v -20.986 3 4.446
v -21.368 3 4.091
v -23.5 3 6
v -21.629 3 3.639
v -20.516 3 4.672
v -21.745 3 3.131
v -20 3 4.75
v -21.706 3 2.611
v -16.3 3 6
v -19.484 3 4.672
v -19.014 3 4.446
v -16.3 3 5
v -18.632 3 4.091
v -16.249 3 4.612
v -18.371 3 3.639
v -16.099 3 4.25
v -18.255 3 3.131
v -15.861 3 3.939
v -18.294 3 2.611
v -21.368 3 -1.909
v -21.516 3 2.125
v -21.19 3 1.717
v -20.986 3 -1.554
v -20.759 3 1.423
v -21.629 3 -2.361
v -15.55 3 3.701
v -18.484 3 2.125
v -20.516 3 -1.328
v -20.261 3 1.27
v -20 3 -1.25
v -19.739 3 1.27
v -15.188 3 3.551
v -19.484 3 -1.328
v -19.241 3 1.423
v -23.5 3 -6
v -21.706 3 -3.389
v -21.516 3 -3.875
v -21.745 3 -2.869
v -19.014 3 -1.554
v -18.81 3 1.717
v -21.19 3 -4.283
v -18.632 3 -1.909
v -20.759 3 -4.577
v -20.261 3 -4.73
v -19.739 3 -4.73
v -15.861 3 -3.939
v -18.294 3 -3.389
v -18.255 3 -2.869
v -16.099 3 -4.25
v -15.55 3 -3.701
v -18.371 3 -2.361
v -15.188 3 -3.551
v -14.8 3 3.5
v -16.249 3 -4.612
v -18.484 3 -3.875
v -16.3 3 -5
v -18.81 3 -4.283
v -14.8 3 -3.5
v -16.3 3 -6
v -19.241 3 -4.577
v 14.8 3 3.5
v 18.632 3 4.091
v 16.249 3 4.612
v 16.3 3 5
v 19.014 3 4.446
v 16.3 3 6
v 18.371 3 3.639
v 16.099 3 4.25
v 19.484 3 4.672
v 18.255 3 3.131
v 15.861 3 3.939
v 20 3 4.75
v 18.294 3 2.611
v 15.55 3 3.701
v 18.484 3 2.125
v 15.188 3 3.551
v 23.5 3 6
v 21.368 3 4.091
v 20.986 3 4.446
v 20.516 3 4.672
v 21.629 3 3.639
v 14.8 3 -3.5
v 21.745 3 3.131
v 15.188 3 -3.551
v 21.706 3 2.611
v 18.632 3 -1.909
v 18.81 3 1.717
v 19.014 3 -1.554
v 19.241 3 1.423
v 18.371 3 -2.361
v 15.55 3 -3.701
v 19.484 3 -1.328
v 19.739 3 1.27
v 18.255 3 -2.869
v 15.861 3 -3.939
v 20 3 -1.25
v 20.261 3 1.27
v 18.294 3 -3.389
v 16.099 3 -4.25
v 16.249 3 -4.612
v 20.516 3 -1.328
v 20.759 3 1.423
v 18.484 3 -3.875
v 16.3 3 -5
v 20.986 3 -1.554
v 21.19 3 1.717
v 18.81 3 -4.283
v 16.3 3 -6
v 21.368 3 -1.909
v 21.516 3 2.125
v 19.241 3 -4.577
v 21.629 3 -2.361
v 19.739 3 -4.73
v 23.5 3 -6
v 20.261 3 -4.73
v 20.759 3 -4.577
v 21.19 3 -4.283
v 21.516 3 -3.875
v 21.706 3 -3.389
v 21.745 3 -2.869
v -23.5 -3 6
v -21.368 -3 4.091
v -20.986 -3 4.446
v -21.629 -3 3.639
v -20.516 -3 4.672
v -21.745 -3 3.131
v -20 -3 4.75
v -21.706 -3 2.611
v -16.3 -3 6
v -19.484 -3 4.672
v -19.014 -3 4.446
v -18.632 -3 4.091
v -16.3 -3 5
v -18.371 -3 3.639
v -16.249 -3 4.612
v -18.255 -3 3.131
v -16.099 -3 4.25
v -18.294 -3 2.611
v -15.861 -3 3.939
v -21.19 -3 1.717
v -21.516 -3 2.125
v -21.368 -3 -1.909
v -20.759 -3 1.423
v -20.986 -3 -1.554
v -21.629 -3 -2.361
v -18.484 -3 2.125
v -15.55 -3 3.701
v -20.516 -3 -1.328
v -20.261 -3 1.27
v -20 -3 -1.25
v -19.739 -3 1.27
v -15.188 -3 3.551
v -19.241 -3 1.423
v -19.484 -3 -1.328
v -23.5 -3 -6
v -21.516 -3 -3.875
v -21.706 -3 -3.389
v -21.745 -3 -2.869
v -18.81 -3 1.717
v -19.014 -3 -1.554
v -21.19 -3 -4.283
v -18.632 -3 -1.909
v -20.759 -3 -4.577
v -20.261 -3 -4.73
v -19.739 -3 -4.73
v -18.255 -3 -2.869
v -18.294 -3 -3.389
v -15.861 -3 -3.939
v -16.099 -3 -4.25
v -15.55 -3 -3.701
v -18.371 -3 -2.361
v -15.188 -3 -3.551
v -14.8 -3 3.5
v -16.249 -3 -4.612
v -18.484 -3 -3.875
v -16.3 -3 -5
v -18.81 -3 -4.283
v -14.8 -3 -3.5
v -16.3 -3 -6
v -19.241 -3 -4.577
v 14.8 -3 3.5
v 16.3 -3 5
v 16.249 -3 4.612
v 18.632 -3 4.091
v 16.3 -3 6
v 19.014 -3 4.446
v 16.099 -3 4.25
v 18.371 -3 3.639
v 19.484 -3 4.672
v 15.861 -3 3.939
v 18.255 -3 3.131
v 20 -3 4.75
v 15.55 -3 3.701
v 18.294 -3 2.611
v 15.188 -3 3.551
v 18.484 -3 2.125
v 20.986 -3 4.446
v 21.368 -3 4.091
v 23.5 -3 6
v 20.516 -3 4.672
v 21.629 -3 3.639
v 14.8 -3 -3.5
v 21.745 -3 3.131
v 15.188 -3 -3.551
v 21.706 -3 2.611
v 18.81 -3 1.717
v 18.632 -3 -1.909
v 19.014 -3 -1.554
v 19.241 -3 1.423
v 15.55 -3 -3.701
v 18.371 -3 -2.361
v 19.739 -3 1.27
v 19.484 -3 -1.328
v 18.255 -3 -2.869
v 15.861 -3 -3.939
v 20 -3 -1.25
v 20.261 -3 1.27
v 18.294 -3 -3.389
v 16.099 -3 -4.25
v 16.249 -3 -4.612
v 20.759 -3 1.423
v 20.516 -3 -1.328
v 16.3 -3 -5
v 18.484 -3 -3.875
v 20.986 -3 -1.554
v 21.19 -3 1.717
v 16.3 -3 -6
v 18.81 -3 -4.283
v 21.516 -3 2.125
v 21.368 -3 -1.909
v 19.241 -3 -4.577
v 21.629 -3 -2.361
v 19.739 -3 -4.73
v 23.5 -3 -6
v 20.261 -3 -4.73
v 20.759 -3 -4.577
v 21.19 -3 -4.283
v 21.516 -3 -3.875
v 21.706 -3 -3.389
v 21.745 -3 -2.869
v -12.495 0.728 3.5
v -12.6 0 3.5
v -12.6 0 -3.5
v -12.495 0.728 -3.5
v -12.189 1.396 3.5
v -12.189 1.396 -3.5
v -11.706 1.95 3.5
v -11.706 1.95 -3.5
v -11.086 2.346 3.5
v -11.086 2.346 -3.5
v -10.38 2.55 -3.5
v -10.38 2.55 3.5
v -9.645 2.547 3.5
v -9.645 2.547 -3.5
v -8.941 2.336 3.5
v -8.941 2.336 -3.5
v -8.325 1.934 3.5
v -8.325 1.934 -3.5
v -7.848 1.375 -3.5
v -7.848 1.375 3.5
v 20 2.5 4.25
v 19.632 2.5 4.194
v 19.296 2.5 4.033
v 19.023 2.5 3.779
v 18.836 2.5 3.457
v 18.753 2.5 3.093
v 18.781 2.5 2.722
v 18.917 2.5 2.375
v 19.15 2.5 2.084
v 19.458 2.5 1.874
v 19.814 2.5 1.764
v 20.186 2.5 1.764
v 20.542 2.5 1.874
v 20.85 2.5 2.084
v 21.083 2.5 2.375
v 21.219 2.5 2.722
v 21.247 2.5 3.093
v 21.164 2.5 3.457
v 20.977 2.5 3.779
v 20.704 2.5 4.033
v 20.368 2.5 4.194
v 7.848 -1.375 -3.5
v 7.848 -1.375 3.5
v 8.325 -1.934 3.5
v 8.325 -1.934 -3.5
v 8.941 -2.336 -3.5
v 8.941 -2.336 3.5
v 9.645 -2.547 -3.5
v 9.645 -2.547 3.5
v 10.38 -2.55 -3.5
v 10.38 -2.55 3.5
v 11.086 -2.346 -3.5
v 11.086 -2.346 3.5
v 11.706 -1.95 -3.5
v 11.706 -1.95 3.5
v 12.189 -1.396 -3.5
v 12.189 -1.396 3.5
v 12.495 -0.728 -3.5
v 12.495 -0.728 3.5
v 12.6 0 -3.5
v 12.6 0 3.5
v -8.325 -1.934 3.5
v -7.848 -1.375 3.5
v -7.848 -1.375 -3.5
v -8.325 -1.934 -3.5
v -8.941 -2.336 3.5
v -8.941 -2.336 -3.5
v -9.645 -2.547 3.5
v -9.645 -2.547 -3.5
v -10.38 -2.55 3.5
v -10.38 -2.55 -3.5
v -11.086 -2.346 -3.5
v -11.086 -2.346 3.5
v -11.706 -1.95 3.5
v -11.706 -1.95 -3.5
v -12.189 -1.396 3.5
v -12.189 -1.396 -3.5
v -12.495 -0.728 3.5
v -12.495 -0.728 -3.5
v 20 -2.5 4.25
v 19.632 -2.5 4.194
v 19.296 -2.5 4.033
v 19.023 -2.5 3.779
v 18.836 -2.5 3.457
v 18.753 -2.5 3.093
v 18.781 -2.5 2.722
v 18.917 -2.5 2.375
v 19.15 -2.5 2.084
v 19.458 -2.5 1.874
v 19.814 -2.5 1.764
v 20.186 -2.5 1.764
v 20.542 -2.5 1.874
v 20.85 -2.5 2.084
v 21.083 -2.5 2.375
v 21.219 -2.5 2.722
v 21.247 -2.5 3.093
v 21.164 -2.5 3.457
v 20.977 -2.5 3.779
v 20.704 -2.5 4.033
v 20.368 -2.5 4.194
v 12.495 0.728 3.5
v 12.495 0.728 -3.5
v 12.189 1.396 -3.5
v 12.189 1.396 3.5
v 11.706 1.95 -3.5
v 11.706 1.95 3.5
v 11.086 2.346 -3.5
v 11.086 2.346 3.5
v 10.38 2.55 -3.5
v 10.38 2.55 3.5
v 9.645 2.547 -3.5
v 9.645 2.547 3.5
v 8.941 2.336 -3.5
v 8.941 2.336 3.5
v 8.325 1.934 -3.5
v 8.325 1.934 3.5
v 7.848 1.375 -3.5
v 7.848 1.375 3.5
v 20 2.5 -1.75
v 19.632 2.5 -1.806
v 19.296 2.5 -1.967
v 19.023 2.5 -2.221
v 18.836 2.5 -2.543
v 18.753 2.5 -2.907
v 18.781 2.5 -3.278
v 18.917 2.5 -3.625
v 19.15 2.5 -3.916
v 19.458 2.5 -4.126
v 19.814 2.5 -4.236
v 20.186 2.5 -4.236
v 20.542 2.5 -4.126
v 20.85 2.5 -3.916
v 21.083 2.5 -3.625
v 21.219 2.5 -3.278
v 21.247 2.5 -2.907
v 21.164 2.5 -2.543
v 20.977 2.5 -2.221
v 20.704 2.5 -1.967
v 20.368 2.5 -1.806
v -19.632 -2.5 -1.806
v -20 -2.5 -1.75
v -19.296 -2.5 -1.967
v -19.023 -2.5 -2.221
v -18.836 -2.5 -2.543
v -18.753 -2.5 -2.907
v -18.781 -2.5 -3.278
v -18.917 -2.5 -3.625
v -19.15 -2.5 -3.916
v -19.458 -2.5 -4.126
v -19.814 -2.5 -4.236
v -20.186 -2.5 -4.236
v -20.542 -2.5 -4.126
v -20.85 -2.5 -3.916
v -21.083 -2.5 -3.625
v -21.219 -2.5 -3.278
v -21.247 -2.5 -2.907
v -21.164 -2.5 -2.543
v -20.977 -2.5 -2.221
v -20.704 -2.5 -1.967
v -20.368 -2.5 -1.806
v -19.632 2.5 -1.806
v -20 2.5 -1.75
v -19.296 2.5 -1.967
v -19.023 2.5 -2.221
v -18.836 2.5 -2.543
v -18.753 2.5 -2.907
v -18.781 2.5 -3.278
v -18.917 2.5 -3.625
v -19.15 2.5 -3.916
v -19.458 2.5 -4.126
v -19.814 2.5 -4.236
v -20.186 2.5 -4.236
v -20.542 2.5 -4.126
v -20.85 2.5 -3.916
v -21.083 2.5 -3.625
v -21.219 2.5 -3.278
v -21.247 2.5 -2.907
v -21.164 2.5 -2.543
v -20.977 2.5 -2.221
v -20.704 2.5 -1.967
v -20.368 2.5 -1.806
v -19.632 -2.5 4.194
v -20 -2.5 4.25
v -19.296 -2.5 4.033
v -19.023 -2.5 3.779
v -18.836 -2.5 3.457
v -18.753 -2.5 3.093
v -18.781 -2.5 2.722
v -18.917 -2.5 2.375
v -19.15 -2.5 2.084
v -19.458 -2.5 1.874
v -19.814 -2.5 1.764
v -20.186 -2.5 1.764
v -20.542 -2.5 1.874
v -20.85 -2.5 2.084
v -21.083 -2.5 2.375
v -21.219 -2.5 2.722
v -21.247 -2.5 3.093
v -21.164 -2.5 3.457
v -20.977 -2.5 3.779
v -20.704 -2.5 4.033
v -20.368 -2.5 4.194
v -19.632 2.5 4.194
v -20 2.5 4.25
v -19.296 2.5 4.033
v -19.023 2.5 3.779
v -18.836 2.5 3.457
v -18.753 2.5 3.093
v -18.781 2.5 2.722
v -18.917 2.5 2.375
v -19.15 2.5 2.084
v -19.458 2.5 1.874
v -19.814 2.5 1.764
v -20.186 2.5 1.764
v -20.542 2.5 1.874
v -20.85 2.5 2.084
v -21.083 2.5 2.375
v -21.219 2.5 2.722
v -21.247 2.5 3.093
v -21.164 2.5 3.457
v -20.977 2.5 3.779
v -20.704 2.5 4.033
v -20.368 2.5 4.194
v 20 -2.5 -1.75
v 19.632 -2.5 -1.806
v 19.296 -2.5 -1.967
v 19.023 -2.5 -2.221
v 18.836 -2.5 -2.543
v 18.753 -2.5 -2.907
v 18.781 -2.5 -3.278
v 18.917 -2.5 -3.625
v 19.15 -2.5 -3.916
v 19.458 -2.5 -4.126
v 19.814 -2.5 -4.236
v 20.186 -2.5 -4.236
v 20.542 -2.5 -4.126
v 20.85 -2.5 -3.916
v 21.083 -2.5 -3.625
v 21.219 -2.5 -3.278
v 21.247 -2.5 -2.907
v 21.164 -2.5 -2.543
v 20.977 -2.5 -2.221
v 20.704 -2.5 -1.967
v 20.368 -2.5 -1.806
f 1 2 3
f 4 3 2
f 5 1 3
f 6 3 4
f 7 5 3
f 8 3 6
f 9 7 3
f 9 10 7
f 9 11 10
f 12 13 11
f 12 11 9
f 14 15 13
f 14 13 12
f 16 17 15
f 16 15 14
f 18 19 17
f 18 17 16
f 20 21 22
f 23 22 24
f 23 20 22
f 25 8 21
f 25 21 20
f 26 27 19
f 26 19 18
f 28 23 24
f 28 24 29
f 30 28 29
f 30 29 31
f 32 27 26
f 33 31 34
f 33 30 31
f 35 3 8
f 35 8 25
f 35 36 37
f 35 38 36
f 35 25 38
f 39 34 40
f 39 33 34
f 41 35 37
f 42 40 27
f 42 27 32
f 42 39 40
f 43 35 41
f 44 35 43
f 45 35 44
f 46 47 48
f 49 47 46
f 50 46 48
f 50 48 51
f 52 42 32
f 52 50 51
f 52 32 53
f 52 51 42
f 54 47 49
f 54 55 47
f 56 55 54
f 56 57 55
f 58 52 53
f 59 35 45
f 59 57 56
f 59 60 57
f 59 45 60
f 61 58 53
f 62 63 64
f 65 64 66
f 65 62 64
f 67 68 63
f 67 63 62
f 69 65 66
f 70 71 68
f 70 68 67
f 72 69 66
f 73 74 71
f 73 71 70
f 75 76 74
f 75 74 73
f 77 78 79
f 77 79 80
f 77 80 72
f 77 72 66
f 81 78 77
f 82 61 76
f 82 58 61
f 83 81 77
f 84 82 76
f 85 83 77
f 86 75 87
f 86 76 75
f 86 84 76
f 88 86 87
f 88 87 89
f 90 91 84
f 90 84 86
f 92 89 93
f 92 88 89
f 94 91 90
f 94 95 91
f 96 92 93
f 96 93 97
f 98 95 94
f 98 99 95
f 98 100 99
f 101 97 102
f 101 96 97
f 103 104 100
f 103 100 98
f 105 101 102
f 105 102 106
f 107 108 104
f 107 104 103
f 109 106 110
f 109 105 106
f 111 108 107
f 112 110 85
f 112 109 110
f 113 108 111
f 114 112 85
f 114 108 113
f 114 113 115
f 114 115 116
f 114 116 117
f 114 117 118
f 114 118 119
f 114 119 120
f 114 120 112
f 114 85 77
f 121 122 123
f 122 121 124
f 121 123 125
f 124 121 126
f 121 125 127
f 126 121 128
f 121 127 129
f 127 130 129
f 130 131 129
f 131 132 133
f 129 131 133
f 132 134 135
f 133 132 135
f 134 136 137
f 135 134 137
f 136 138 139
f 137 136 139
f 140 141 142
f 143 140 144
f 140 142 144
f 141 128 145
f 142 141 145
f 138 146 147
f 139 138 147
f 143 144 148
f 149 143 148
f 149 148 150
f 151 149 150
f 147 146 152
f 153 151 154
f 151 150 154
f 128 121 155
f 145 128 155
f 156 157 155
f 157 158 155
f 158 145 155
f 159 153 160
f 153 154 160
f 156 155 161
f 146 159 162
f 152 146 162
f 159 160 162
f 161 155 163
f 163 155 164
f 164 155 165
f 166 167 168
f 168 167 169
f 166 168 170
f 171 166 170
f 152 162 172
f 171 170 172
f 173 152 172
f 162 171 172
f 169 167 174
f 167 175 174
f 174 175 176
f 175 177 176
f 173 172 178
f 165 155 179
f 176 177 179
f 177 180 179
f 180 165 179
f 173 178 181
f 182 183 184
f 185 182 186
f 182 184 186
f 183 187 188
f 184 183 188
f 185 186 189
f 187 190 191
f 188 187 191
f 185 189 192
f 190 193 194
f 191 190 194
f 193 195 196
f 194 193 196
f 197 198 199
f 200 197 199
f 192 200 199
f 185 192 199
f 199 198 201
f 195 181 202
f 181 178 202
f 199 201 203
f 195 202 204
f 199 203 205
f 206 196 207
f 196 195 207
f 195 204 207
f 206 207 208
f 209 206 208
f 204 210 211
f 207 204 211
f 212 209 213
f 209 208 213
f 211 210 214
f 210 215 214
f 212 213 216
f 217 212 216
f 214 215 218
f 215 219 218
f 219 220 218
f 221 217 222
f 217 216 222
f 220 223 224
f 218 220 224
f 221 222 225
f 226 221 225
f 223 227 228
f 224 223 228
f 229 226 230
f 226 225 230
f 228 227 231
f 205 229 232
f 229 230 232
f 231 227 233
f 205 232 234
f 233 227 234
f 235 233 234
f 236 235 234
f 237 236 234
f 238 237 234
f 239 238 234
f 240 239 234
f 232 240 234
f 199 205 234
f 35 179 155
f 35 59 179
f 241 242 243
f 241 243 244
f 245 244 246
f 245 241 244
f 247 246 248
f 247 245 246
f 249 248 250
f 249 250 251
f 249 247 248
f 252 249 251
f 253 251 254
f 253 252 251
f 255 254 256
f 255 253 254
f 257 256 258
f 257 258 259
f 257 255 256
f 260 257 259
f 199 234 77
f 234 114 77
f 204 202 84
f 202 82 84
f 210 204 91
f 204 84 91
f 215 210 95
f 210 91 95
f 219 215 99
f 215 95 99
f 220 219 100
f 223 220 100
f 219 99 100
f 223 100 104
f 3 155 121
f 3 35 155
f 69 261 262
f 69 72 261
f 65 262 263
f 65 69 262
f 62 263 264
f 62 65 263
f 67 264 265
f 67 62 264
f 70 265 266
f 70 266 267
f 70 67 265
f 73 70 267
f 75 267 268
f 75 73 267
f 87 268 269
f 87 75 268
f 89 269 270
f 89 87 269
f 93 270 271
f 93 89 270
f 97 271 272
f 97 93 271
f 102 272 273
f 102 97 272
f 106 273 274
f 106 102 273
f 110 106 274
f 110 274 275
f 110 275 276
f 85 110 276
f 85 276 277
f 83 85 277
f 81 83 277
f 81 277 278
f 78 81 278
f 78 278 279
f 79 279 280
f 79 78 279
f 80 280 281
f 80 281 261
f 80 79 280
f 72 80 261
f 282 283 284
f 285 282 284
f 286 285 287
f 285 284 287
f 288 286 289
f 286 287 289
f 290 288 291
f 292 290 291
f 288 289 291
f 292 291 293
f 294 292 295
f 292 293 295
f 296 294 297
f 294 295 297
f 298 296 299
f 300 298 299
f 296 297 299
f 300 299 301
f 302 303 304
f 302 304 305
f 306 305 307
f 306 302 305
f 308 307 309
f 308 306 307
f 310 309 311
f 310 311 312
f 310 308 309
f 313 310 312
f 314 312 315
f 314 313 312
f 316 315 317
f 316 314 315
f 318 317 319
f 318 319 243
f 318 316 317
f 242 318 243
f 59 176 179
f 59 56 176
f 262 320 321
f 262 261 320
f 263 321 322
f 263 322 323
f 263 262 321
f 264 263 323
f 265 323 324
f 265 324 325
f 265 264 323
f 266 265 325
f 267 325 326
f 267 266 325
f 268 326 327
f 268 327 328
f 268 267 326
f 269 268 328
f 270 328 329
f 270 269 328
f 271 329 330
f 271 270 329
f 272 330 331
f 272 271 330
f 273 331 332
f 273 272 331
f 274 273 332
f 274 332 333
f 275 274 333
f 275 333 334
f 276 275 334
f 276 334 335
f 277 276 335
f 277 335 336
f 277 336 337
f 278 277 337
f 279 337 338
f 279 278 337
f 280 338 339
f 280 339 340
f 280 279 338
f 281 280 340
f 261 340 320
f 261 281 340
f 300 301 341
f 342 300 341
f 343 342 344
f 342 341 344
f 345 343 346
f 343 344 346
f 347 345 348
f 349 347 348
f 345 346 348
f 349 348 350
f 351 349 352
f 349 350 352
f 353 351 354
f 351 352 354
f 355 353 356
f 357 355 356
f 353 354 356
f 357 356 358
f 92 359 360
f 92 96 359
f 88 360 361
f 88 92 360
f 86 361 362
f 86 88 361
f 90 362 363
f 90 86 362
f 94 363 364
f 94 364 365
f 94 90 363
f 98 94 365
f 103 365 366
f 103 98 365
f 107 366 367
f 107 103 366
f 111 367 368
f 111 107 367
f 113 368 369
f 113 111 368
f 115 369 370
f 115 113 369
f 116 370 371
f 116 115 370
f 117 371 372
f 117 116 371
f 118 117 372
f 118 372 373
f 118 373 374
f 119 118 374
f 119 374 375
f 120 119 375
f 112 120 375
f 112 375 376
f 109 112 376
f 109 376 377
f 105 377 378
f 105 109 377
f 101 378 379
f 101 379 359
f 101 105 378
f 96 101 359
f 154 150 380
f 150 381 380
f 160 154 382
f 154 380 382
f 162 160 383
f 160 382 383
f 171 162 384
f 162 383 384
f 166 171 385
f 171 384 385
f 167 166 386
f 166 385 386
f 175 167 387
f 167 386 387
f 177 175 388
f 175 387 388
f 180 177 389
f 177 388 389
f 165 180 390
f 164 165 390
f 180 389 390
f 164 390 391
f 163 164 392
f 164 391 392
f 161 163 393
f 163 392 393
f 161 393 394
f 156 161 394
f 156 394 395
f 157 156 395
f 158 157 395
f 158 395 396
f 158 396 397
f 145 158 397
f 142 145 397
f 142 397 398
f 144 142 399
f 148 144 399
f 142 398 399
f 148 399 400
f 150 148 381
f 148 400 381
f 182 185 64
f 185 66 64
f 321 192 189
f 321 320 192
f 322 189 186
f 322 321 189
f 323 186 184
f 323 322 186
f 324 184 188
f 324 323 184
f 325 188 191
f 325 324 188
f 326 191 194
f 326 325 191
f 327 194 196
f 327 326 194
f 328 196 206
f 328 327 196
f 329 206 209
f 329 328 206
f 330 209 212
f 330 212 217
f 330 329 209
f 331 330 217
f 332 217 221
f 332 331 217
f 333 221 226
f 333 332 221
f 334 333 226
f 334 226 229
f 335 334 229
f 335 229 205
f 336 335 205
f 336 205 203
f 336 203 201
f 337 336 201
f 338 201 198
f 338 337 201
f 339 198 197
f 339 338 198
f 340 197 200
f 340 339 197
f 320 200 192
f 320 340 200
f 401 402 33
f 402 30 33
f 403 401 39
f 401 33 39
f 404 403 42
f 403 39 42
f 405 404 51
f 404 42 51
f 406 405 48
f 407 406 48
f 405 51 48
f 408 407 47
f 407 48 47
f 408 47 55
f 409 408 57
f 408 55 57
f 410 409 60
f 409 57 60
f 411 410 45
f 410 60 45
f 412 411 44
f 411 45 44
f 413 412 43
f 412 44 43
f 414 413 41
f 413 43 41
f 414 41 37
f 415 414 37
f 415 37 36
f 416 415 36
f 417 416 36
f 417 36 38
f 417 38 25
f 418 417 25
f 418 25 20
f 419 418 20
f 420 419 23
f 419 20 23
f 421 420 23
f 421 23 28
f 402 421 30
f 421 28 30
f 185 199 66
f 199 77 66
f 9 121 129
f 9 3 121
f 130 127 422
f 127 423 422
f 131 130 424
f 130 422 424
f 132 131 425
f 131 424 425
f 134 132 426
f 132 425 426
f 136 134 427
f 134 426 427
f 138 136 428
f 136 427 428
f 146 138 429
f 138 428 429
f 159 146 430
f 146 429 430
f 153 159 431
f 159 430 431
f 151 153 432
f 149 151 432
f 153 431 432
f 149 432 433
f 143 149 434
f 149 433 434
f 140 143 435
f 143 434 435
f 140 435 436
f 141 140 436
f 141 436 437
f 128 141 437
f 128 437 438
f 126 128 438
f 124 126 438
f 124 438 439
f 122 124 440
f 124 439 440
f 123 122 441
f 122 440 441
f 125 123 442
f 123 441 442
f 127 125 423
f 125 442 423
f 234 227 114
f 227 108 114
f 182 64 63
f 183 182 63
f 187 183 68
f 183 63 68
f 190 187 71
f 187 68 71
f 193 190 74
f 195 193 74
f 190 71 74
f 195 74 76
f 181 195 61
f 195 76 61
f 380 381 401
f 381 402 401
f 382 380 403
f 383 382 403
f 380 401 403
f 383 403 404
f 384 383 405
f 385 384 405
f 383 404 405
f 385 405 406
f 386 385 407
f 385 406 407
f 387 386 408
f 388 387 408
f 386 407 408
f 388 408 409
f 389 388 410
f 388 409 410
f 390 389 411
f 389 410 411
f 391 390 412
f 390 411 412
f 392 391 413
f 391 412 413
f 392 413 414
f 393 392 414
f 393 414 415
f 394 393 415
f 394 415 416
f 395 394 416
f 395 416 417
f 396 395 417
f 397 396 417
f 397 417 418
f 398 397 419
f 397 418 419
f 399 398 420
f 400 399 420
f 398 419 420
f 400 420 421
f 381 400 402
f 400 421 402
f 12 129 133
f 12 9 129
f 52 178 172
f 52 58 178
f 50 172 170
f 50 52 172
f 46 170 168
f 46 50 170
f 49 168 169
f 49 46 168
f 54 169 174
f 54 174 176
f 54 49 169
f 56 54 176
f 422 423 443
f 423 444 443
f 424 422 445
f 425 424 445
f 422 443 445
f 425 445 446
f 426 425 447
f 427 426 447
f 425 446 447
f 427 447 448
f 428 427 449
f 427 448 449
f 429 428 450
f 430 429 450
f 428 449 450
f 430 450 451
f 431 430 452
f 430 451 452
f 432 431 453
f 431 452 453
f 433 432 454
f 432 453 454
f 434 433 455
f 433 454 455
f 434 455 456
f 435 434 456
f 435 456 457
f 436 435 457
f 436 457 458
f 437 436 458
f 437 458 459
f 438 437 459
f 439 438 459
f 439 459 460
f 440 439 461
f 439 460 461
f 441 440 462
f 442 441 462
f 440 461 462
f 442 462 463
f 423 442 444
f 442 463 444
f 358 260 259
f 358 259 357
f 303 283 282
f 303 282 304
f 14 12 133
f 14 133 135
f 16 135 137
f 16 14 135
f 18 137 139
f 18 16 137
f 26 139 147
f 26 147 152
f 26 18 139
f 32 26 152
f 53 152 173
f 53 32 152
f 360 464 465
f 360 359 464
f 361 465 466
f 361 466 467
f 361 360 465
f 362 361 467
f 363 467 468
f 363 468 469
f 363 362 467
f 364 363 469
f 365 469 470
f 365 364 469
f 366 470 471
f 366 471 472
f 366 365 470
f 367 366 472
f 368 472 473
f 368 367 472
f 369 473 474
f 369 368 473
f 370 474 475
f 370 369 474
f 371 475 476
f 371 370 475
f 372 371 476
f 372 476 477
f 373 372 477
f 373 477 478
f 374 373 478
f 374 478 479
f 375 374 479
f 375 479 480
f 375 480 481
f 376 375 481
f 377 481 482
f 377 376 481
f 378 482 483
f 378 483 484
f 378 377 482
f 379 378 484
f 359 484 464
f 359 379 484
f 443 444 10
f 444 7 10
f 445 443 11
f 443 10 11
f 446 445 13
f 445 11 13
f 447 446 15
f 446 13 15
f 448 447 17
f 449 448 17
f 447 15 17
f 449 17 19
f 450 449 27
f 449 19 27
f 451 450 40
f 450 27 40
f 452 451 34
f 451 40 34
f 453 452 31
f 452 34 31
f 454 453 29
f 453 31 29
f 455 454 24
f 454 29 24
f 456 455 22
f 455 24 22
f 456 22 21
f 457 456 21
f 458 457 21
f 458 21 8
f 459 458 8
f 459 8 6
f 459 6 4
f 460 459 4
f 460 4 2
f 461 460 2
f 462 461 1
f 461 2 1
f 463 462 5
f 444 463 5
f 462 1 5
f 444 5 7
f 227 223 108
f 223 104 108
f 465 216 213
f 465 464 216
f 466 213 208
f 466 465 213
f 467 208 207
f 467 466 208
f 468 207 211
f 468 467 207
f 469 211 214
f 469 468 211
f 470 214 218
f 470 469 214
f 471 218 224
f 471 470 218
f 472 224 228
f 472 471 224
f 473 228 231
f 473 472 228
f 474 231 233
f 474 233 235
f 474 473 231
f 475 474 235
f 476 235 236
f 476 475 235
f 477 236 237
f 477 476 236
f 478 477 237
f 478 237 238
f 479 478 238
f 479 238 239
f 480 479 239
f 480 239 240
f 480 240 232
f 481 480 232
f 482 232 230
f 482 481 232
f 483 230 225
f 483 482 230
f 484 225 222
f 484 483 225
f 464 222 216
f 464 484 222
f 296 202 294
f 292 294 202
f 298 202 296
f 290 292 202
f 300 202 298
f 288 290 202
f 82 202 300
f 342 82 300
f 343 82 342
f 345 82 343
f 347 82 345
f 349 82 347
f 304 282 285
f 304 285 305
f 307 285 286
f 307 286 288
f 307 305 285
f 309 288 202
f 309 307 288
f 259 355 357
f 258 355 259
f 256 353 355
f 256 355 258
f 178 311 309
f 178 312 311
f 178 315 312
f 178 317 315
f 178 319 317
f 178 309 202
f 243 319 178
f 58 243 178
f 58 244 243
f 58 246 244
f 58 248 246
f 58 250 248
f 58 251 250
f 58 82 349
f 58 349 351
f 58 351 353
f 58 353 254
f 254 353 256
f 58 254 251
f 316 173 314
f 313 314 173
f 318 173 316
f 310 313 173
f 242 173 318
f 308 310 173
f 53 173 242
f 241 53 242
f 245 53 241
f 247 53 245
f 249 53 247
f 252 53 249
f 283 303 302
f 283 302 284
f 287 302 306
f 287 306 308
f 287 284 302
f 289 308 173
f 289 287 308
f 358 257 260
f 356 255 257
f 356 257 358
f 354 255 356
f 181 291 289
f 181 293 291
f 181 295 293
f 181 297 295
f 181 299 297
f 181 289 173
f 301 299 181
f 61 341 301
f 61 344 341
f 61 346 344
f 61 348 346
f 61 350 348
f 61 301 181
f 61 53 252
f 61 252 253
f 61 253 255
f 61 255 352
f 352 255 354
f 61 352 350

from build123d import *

# Parameters (mm, degrees)
BOSS_EXTRUDE1_DEPTH        = 3
CUT_EXTRUDE1_DEPTH         = 10.5
M3_TAPPED_HOLE1_AT_2_COUNT = 2
M3_TAPPED_HOLE1_AT_2_PITCH = 6


with BuildPart() as part:
    # Sketch1 → Boss-Extrude1 (new body, symmetric)
    with BuildSketch(Plane(origin=(0, 0, 0), x_dir=(1, 0, 0), z_dir=(0, 1, 0))):
        with BuildLine():
            Line((0, -3.5), (0, 3.5))
            Line((0, 3.5), (14.8, 3.5))
            ThreePointArc((14.8, 3.5), (15.860660172, 3.939339828), (16.3, 5))
            Line((16.3, 5), (16.3, 6))
            Line((16.3, 6), (23.5, 6))
            Line((23.5, 6), (23.5, -6))
            Line((23.5, -6), (16.3, -6))
            Line((16.3, -6), (16.3, -5))
            ThreePointArc((16.3, -5), (15.860660172, -3.939339828), (14.8, -3.5))
            Line((14.8, -3.5), (0, -3.5))
        make_face()
    extrude(amount=BOSS_EXTRUDE1_DEPTH, both=True)

    # Sketch2 → Cut-Extrude1 (cut, through all)
    with BuildSketch(Plane.XY.offset(3.5)):
        with BuildLine():
            ThreePointArc((7.847845894, 1.375), (7.45, 0), (7.847845894, -1.375))
            Line((7.847845894, -1.375), (10.025, -1.375))
            Line((10.025, -1.375), (10.025, 1.375))
            Line((10.025, 1.375), (7.847845894, 1.375))
        make_face()
        with BuildLine():
            Line((10.025, -1.375), (7.847845894, -1.375))
            ThreePointArc((7.847845894, -1.375), (10.740700069, -2.473539652), (12.6, 0))
            ThreePointArc((12.6, 0), (10.740700069, 2.473539652), (7.847845894, 1.375))
            Line((7.847845894, 1.375), (10.025, 1.375))
            Line((10.025, 1.375), (10.025, -1.375))
        make_face()
        with BuildLine():
            Line((0, 1.375), (0, -1.375))
            Line((0, -1.375), (7.847845894, -1.375))
            ThreePointArc((7.847845894, -1.375), (7.45, 0), (7.847845894, 1.375))
            Line((7.847845894, 1.375), (0, 1.375))
        make_face()
    extrude(amount=-CUT_EXTRUDE1_DEPTH, mode=Mode.SUBTRACT)

    # Sketch5 → M3 Tapped Hole1 (revolve, cut)
    with BuildSketch(Plane(origin=(20, 3, -3), x_dir=(0, 0, 1), z_dir=(1, 0, 0))):
        Polygon((0, 0), (0, 6), (1.75, 6), (1.25, 5.5), (1.25, 0.5), (1.75, 0), align=None)
    m3_tapped_hole1 = revolve(axis=Axis((20, 9.35, -3), (0, -1, 0)), mode=Mode.SUBTRACT)

    # M3 Tapped Hole1 at 2: M3 Tapped Hole1 ×2
    with Locations(*[(0, 0, i * M3_TAPPED_HOLE1_AT_2_PITCH) for i in range(1, M3_TAPPED_HOLE1_AT_2_COUNT)]):
        add(m3_tapped_hole1, mode=Mode.SUBTRACT)

    # Mirror1: part across plane


with BuildPart() as part_1:
    add(part.part)
    add(part.part.mirror(Plane(origin=(0, 0, 0), x_dir=(0, 0, 1), z_dir=(1, 0, 0))))


solid = part_1.part
